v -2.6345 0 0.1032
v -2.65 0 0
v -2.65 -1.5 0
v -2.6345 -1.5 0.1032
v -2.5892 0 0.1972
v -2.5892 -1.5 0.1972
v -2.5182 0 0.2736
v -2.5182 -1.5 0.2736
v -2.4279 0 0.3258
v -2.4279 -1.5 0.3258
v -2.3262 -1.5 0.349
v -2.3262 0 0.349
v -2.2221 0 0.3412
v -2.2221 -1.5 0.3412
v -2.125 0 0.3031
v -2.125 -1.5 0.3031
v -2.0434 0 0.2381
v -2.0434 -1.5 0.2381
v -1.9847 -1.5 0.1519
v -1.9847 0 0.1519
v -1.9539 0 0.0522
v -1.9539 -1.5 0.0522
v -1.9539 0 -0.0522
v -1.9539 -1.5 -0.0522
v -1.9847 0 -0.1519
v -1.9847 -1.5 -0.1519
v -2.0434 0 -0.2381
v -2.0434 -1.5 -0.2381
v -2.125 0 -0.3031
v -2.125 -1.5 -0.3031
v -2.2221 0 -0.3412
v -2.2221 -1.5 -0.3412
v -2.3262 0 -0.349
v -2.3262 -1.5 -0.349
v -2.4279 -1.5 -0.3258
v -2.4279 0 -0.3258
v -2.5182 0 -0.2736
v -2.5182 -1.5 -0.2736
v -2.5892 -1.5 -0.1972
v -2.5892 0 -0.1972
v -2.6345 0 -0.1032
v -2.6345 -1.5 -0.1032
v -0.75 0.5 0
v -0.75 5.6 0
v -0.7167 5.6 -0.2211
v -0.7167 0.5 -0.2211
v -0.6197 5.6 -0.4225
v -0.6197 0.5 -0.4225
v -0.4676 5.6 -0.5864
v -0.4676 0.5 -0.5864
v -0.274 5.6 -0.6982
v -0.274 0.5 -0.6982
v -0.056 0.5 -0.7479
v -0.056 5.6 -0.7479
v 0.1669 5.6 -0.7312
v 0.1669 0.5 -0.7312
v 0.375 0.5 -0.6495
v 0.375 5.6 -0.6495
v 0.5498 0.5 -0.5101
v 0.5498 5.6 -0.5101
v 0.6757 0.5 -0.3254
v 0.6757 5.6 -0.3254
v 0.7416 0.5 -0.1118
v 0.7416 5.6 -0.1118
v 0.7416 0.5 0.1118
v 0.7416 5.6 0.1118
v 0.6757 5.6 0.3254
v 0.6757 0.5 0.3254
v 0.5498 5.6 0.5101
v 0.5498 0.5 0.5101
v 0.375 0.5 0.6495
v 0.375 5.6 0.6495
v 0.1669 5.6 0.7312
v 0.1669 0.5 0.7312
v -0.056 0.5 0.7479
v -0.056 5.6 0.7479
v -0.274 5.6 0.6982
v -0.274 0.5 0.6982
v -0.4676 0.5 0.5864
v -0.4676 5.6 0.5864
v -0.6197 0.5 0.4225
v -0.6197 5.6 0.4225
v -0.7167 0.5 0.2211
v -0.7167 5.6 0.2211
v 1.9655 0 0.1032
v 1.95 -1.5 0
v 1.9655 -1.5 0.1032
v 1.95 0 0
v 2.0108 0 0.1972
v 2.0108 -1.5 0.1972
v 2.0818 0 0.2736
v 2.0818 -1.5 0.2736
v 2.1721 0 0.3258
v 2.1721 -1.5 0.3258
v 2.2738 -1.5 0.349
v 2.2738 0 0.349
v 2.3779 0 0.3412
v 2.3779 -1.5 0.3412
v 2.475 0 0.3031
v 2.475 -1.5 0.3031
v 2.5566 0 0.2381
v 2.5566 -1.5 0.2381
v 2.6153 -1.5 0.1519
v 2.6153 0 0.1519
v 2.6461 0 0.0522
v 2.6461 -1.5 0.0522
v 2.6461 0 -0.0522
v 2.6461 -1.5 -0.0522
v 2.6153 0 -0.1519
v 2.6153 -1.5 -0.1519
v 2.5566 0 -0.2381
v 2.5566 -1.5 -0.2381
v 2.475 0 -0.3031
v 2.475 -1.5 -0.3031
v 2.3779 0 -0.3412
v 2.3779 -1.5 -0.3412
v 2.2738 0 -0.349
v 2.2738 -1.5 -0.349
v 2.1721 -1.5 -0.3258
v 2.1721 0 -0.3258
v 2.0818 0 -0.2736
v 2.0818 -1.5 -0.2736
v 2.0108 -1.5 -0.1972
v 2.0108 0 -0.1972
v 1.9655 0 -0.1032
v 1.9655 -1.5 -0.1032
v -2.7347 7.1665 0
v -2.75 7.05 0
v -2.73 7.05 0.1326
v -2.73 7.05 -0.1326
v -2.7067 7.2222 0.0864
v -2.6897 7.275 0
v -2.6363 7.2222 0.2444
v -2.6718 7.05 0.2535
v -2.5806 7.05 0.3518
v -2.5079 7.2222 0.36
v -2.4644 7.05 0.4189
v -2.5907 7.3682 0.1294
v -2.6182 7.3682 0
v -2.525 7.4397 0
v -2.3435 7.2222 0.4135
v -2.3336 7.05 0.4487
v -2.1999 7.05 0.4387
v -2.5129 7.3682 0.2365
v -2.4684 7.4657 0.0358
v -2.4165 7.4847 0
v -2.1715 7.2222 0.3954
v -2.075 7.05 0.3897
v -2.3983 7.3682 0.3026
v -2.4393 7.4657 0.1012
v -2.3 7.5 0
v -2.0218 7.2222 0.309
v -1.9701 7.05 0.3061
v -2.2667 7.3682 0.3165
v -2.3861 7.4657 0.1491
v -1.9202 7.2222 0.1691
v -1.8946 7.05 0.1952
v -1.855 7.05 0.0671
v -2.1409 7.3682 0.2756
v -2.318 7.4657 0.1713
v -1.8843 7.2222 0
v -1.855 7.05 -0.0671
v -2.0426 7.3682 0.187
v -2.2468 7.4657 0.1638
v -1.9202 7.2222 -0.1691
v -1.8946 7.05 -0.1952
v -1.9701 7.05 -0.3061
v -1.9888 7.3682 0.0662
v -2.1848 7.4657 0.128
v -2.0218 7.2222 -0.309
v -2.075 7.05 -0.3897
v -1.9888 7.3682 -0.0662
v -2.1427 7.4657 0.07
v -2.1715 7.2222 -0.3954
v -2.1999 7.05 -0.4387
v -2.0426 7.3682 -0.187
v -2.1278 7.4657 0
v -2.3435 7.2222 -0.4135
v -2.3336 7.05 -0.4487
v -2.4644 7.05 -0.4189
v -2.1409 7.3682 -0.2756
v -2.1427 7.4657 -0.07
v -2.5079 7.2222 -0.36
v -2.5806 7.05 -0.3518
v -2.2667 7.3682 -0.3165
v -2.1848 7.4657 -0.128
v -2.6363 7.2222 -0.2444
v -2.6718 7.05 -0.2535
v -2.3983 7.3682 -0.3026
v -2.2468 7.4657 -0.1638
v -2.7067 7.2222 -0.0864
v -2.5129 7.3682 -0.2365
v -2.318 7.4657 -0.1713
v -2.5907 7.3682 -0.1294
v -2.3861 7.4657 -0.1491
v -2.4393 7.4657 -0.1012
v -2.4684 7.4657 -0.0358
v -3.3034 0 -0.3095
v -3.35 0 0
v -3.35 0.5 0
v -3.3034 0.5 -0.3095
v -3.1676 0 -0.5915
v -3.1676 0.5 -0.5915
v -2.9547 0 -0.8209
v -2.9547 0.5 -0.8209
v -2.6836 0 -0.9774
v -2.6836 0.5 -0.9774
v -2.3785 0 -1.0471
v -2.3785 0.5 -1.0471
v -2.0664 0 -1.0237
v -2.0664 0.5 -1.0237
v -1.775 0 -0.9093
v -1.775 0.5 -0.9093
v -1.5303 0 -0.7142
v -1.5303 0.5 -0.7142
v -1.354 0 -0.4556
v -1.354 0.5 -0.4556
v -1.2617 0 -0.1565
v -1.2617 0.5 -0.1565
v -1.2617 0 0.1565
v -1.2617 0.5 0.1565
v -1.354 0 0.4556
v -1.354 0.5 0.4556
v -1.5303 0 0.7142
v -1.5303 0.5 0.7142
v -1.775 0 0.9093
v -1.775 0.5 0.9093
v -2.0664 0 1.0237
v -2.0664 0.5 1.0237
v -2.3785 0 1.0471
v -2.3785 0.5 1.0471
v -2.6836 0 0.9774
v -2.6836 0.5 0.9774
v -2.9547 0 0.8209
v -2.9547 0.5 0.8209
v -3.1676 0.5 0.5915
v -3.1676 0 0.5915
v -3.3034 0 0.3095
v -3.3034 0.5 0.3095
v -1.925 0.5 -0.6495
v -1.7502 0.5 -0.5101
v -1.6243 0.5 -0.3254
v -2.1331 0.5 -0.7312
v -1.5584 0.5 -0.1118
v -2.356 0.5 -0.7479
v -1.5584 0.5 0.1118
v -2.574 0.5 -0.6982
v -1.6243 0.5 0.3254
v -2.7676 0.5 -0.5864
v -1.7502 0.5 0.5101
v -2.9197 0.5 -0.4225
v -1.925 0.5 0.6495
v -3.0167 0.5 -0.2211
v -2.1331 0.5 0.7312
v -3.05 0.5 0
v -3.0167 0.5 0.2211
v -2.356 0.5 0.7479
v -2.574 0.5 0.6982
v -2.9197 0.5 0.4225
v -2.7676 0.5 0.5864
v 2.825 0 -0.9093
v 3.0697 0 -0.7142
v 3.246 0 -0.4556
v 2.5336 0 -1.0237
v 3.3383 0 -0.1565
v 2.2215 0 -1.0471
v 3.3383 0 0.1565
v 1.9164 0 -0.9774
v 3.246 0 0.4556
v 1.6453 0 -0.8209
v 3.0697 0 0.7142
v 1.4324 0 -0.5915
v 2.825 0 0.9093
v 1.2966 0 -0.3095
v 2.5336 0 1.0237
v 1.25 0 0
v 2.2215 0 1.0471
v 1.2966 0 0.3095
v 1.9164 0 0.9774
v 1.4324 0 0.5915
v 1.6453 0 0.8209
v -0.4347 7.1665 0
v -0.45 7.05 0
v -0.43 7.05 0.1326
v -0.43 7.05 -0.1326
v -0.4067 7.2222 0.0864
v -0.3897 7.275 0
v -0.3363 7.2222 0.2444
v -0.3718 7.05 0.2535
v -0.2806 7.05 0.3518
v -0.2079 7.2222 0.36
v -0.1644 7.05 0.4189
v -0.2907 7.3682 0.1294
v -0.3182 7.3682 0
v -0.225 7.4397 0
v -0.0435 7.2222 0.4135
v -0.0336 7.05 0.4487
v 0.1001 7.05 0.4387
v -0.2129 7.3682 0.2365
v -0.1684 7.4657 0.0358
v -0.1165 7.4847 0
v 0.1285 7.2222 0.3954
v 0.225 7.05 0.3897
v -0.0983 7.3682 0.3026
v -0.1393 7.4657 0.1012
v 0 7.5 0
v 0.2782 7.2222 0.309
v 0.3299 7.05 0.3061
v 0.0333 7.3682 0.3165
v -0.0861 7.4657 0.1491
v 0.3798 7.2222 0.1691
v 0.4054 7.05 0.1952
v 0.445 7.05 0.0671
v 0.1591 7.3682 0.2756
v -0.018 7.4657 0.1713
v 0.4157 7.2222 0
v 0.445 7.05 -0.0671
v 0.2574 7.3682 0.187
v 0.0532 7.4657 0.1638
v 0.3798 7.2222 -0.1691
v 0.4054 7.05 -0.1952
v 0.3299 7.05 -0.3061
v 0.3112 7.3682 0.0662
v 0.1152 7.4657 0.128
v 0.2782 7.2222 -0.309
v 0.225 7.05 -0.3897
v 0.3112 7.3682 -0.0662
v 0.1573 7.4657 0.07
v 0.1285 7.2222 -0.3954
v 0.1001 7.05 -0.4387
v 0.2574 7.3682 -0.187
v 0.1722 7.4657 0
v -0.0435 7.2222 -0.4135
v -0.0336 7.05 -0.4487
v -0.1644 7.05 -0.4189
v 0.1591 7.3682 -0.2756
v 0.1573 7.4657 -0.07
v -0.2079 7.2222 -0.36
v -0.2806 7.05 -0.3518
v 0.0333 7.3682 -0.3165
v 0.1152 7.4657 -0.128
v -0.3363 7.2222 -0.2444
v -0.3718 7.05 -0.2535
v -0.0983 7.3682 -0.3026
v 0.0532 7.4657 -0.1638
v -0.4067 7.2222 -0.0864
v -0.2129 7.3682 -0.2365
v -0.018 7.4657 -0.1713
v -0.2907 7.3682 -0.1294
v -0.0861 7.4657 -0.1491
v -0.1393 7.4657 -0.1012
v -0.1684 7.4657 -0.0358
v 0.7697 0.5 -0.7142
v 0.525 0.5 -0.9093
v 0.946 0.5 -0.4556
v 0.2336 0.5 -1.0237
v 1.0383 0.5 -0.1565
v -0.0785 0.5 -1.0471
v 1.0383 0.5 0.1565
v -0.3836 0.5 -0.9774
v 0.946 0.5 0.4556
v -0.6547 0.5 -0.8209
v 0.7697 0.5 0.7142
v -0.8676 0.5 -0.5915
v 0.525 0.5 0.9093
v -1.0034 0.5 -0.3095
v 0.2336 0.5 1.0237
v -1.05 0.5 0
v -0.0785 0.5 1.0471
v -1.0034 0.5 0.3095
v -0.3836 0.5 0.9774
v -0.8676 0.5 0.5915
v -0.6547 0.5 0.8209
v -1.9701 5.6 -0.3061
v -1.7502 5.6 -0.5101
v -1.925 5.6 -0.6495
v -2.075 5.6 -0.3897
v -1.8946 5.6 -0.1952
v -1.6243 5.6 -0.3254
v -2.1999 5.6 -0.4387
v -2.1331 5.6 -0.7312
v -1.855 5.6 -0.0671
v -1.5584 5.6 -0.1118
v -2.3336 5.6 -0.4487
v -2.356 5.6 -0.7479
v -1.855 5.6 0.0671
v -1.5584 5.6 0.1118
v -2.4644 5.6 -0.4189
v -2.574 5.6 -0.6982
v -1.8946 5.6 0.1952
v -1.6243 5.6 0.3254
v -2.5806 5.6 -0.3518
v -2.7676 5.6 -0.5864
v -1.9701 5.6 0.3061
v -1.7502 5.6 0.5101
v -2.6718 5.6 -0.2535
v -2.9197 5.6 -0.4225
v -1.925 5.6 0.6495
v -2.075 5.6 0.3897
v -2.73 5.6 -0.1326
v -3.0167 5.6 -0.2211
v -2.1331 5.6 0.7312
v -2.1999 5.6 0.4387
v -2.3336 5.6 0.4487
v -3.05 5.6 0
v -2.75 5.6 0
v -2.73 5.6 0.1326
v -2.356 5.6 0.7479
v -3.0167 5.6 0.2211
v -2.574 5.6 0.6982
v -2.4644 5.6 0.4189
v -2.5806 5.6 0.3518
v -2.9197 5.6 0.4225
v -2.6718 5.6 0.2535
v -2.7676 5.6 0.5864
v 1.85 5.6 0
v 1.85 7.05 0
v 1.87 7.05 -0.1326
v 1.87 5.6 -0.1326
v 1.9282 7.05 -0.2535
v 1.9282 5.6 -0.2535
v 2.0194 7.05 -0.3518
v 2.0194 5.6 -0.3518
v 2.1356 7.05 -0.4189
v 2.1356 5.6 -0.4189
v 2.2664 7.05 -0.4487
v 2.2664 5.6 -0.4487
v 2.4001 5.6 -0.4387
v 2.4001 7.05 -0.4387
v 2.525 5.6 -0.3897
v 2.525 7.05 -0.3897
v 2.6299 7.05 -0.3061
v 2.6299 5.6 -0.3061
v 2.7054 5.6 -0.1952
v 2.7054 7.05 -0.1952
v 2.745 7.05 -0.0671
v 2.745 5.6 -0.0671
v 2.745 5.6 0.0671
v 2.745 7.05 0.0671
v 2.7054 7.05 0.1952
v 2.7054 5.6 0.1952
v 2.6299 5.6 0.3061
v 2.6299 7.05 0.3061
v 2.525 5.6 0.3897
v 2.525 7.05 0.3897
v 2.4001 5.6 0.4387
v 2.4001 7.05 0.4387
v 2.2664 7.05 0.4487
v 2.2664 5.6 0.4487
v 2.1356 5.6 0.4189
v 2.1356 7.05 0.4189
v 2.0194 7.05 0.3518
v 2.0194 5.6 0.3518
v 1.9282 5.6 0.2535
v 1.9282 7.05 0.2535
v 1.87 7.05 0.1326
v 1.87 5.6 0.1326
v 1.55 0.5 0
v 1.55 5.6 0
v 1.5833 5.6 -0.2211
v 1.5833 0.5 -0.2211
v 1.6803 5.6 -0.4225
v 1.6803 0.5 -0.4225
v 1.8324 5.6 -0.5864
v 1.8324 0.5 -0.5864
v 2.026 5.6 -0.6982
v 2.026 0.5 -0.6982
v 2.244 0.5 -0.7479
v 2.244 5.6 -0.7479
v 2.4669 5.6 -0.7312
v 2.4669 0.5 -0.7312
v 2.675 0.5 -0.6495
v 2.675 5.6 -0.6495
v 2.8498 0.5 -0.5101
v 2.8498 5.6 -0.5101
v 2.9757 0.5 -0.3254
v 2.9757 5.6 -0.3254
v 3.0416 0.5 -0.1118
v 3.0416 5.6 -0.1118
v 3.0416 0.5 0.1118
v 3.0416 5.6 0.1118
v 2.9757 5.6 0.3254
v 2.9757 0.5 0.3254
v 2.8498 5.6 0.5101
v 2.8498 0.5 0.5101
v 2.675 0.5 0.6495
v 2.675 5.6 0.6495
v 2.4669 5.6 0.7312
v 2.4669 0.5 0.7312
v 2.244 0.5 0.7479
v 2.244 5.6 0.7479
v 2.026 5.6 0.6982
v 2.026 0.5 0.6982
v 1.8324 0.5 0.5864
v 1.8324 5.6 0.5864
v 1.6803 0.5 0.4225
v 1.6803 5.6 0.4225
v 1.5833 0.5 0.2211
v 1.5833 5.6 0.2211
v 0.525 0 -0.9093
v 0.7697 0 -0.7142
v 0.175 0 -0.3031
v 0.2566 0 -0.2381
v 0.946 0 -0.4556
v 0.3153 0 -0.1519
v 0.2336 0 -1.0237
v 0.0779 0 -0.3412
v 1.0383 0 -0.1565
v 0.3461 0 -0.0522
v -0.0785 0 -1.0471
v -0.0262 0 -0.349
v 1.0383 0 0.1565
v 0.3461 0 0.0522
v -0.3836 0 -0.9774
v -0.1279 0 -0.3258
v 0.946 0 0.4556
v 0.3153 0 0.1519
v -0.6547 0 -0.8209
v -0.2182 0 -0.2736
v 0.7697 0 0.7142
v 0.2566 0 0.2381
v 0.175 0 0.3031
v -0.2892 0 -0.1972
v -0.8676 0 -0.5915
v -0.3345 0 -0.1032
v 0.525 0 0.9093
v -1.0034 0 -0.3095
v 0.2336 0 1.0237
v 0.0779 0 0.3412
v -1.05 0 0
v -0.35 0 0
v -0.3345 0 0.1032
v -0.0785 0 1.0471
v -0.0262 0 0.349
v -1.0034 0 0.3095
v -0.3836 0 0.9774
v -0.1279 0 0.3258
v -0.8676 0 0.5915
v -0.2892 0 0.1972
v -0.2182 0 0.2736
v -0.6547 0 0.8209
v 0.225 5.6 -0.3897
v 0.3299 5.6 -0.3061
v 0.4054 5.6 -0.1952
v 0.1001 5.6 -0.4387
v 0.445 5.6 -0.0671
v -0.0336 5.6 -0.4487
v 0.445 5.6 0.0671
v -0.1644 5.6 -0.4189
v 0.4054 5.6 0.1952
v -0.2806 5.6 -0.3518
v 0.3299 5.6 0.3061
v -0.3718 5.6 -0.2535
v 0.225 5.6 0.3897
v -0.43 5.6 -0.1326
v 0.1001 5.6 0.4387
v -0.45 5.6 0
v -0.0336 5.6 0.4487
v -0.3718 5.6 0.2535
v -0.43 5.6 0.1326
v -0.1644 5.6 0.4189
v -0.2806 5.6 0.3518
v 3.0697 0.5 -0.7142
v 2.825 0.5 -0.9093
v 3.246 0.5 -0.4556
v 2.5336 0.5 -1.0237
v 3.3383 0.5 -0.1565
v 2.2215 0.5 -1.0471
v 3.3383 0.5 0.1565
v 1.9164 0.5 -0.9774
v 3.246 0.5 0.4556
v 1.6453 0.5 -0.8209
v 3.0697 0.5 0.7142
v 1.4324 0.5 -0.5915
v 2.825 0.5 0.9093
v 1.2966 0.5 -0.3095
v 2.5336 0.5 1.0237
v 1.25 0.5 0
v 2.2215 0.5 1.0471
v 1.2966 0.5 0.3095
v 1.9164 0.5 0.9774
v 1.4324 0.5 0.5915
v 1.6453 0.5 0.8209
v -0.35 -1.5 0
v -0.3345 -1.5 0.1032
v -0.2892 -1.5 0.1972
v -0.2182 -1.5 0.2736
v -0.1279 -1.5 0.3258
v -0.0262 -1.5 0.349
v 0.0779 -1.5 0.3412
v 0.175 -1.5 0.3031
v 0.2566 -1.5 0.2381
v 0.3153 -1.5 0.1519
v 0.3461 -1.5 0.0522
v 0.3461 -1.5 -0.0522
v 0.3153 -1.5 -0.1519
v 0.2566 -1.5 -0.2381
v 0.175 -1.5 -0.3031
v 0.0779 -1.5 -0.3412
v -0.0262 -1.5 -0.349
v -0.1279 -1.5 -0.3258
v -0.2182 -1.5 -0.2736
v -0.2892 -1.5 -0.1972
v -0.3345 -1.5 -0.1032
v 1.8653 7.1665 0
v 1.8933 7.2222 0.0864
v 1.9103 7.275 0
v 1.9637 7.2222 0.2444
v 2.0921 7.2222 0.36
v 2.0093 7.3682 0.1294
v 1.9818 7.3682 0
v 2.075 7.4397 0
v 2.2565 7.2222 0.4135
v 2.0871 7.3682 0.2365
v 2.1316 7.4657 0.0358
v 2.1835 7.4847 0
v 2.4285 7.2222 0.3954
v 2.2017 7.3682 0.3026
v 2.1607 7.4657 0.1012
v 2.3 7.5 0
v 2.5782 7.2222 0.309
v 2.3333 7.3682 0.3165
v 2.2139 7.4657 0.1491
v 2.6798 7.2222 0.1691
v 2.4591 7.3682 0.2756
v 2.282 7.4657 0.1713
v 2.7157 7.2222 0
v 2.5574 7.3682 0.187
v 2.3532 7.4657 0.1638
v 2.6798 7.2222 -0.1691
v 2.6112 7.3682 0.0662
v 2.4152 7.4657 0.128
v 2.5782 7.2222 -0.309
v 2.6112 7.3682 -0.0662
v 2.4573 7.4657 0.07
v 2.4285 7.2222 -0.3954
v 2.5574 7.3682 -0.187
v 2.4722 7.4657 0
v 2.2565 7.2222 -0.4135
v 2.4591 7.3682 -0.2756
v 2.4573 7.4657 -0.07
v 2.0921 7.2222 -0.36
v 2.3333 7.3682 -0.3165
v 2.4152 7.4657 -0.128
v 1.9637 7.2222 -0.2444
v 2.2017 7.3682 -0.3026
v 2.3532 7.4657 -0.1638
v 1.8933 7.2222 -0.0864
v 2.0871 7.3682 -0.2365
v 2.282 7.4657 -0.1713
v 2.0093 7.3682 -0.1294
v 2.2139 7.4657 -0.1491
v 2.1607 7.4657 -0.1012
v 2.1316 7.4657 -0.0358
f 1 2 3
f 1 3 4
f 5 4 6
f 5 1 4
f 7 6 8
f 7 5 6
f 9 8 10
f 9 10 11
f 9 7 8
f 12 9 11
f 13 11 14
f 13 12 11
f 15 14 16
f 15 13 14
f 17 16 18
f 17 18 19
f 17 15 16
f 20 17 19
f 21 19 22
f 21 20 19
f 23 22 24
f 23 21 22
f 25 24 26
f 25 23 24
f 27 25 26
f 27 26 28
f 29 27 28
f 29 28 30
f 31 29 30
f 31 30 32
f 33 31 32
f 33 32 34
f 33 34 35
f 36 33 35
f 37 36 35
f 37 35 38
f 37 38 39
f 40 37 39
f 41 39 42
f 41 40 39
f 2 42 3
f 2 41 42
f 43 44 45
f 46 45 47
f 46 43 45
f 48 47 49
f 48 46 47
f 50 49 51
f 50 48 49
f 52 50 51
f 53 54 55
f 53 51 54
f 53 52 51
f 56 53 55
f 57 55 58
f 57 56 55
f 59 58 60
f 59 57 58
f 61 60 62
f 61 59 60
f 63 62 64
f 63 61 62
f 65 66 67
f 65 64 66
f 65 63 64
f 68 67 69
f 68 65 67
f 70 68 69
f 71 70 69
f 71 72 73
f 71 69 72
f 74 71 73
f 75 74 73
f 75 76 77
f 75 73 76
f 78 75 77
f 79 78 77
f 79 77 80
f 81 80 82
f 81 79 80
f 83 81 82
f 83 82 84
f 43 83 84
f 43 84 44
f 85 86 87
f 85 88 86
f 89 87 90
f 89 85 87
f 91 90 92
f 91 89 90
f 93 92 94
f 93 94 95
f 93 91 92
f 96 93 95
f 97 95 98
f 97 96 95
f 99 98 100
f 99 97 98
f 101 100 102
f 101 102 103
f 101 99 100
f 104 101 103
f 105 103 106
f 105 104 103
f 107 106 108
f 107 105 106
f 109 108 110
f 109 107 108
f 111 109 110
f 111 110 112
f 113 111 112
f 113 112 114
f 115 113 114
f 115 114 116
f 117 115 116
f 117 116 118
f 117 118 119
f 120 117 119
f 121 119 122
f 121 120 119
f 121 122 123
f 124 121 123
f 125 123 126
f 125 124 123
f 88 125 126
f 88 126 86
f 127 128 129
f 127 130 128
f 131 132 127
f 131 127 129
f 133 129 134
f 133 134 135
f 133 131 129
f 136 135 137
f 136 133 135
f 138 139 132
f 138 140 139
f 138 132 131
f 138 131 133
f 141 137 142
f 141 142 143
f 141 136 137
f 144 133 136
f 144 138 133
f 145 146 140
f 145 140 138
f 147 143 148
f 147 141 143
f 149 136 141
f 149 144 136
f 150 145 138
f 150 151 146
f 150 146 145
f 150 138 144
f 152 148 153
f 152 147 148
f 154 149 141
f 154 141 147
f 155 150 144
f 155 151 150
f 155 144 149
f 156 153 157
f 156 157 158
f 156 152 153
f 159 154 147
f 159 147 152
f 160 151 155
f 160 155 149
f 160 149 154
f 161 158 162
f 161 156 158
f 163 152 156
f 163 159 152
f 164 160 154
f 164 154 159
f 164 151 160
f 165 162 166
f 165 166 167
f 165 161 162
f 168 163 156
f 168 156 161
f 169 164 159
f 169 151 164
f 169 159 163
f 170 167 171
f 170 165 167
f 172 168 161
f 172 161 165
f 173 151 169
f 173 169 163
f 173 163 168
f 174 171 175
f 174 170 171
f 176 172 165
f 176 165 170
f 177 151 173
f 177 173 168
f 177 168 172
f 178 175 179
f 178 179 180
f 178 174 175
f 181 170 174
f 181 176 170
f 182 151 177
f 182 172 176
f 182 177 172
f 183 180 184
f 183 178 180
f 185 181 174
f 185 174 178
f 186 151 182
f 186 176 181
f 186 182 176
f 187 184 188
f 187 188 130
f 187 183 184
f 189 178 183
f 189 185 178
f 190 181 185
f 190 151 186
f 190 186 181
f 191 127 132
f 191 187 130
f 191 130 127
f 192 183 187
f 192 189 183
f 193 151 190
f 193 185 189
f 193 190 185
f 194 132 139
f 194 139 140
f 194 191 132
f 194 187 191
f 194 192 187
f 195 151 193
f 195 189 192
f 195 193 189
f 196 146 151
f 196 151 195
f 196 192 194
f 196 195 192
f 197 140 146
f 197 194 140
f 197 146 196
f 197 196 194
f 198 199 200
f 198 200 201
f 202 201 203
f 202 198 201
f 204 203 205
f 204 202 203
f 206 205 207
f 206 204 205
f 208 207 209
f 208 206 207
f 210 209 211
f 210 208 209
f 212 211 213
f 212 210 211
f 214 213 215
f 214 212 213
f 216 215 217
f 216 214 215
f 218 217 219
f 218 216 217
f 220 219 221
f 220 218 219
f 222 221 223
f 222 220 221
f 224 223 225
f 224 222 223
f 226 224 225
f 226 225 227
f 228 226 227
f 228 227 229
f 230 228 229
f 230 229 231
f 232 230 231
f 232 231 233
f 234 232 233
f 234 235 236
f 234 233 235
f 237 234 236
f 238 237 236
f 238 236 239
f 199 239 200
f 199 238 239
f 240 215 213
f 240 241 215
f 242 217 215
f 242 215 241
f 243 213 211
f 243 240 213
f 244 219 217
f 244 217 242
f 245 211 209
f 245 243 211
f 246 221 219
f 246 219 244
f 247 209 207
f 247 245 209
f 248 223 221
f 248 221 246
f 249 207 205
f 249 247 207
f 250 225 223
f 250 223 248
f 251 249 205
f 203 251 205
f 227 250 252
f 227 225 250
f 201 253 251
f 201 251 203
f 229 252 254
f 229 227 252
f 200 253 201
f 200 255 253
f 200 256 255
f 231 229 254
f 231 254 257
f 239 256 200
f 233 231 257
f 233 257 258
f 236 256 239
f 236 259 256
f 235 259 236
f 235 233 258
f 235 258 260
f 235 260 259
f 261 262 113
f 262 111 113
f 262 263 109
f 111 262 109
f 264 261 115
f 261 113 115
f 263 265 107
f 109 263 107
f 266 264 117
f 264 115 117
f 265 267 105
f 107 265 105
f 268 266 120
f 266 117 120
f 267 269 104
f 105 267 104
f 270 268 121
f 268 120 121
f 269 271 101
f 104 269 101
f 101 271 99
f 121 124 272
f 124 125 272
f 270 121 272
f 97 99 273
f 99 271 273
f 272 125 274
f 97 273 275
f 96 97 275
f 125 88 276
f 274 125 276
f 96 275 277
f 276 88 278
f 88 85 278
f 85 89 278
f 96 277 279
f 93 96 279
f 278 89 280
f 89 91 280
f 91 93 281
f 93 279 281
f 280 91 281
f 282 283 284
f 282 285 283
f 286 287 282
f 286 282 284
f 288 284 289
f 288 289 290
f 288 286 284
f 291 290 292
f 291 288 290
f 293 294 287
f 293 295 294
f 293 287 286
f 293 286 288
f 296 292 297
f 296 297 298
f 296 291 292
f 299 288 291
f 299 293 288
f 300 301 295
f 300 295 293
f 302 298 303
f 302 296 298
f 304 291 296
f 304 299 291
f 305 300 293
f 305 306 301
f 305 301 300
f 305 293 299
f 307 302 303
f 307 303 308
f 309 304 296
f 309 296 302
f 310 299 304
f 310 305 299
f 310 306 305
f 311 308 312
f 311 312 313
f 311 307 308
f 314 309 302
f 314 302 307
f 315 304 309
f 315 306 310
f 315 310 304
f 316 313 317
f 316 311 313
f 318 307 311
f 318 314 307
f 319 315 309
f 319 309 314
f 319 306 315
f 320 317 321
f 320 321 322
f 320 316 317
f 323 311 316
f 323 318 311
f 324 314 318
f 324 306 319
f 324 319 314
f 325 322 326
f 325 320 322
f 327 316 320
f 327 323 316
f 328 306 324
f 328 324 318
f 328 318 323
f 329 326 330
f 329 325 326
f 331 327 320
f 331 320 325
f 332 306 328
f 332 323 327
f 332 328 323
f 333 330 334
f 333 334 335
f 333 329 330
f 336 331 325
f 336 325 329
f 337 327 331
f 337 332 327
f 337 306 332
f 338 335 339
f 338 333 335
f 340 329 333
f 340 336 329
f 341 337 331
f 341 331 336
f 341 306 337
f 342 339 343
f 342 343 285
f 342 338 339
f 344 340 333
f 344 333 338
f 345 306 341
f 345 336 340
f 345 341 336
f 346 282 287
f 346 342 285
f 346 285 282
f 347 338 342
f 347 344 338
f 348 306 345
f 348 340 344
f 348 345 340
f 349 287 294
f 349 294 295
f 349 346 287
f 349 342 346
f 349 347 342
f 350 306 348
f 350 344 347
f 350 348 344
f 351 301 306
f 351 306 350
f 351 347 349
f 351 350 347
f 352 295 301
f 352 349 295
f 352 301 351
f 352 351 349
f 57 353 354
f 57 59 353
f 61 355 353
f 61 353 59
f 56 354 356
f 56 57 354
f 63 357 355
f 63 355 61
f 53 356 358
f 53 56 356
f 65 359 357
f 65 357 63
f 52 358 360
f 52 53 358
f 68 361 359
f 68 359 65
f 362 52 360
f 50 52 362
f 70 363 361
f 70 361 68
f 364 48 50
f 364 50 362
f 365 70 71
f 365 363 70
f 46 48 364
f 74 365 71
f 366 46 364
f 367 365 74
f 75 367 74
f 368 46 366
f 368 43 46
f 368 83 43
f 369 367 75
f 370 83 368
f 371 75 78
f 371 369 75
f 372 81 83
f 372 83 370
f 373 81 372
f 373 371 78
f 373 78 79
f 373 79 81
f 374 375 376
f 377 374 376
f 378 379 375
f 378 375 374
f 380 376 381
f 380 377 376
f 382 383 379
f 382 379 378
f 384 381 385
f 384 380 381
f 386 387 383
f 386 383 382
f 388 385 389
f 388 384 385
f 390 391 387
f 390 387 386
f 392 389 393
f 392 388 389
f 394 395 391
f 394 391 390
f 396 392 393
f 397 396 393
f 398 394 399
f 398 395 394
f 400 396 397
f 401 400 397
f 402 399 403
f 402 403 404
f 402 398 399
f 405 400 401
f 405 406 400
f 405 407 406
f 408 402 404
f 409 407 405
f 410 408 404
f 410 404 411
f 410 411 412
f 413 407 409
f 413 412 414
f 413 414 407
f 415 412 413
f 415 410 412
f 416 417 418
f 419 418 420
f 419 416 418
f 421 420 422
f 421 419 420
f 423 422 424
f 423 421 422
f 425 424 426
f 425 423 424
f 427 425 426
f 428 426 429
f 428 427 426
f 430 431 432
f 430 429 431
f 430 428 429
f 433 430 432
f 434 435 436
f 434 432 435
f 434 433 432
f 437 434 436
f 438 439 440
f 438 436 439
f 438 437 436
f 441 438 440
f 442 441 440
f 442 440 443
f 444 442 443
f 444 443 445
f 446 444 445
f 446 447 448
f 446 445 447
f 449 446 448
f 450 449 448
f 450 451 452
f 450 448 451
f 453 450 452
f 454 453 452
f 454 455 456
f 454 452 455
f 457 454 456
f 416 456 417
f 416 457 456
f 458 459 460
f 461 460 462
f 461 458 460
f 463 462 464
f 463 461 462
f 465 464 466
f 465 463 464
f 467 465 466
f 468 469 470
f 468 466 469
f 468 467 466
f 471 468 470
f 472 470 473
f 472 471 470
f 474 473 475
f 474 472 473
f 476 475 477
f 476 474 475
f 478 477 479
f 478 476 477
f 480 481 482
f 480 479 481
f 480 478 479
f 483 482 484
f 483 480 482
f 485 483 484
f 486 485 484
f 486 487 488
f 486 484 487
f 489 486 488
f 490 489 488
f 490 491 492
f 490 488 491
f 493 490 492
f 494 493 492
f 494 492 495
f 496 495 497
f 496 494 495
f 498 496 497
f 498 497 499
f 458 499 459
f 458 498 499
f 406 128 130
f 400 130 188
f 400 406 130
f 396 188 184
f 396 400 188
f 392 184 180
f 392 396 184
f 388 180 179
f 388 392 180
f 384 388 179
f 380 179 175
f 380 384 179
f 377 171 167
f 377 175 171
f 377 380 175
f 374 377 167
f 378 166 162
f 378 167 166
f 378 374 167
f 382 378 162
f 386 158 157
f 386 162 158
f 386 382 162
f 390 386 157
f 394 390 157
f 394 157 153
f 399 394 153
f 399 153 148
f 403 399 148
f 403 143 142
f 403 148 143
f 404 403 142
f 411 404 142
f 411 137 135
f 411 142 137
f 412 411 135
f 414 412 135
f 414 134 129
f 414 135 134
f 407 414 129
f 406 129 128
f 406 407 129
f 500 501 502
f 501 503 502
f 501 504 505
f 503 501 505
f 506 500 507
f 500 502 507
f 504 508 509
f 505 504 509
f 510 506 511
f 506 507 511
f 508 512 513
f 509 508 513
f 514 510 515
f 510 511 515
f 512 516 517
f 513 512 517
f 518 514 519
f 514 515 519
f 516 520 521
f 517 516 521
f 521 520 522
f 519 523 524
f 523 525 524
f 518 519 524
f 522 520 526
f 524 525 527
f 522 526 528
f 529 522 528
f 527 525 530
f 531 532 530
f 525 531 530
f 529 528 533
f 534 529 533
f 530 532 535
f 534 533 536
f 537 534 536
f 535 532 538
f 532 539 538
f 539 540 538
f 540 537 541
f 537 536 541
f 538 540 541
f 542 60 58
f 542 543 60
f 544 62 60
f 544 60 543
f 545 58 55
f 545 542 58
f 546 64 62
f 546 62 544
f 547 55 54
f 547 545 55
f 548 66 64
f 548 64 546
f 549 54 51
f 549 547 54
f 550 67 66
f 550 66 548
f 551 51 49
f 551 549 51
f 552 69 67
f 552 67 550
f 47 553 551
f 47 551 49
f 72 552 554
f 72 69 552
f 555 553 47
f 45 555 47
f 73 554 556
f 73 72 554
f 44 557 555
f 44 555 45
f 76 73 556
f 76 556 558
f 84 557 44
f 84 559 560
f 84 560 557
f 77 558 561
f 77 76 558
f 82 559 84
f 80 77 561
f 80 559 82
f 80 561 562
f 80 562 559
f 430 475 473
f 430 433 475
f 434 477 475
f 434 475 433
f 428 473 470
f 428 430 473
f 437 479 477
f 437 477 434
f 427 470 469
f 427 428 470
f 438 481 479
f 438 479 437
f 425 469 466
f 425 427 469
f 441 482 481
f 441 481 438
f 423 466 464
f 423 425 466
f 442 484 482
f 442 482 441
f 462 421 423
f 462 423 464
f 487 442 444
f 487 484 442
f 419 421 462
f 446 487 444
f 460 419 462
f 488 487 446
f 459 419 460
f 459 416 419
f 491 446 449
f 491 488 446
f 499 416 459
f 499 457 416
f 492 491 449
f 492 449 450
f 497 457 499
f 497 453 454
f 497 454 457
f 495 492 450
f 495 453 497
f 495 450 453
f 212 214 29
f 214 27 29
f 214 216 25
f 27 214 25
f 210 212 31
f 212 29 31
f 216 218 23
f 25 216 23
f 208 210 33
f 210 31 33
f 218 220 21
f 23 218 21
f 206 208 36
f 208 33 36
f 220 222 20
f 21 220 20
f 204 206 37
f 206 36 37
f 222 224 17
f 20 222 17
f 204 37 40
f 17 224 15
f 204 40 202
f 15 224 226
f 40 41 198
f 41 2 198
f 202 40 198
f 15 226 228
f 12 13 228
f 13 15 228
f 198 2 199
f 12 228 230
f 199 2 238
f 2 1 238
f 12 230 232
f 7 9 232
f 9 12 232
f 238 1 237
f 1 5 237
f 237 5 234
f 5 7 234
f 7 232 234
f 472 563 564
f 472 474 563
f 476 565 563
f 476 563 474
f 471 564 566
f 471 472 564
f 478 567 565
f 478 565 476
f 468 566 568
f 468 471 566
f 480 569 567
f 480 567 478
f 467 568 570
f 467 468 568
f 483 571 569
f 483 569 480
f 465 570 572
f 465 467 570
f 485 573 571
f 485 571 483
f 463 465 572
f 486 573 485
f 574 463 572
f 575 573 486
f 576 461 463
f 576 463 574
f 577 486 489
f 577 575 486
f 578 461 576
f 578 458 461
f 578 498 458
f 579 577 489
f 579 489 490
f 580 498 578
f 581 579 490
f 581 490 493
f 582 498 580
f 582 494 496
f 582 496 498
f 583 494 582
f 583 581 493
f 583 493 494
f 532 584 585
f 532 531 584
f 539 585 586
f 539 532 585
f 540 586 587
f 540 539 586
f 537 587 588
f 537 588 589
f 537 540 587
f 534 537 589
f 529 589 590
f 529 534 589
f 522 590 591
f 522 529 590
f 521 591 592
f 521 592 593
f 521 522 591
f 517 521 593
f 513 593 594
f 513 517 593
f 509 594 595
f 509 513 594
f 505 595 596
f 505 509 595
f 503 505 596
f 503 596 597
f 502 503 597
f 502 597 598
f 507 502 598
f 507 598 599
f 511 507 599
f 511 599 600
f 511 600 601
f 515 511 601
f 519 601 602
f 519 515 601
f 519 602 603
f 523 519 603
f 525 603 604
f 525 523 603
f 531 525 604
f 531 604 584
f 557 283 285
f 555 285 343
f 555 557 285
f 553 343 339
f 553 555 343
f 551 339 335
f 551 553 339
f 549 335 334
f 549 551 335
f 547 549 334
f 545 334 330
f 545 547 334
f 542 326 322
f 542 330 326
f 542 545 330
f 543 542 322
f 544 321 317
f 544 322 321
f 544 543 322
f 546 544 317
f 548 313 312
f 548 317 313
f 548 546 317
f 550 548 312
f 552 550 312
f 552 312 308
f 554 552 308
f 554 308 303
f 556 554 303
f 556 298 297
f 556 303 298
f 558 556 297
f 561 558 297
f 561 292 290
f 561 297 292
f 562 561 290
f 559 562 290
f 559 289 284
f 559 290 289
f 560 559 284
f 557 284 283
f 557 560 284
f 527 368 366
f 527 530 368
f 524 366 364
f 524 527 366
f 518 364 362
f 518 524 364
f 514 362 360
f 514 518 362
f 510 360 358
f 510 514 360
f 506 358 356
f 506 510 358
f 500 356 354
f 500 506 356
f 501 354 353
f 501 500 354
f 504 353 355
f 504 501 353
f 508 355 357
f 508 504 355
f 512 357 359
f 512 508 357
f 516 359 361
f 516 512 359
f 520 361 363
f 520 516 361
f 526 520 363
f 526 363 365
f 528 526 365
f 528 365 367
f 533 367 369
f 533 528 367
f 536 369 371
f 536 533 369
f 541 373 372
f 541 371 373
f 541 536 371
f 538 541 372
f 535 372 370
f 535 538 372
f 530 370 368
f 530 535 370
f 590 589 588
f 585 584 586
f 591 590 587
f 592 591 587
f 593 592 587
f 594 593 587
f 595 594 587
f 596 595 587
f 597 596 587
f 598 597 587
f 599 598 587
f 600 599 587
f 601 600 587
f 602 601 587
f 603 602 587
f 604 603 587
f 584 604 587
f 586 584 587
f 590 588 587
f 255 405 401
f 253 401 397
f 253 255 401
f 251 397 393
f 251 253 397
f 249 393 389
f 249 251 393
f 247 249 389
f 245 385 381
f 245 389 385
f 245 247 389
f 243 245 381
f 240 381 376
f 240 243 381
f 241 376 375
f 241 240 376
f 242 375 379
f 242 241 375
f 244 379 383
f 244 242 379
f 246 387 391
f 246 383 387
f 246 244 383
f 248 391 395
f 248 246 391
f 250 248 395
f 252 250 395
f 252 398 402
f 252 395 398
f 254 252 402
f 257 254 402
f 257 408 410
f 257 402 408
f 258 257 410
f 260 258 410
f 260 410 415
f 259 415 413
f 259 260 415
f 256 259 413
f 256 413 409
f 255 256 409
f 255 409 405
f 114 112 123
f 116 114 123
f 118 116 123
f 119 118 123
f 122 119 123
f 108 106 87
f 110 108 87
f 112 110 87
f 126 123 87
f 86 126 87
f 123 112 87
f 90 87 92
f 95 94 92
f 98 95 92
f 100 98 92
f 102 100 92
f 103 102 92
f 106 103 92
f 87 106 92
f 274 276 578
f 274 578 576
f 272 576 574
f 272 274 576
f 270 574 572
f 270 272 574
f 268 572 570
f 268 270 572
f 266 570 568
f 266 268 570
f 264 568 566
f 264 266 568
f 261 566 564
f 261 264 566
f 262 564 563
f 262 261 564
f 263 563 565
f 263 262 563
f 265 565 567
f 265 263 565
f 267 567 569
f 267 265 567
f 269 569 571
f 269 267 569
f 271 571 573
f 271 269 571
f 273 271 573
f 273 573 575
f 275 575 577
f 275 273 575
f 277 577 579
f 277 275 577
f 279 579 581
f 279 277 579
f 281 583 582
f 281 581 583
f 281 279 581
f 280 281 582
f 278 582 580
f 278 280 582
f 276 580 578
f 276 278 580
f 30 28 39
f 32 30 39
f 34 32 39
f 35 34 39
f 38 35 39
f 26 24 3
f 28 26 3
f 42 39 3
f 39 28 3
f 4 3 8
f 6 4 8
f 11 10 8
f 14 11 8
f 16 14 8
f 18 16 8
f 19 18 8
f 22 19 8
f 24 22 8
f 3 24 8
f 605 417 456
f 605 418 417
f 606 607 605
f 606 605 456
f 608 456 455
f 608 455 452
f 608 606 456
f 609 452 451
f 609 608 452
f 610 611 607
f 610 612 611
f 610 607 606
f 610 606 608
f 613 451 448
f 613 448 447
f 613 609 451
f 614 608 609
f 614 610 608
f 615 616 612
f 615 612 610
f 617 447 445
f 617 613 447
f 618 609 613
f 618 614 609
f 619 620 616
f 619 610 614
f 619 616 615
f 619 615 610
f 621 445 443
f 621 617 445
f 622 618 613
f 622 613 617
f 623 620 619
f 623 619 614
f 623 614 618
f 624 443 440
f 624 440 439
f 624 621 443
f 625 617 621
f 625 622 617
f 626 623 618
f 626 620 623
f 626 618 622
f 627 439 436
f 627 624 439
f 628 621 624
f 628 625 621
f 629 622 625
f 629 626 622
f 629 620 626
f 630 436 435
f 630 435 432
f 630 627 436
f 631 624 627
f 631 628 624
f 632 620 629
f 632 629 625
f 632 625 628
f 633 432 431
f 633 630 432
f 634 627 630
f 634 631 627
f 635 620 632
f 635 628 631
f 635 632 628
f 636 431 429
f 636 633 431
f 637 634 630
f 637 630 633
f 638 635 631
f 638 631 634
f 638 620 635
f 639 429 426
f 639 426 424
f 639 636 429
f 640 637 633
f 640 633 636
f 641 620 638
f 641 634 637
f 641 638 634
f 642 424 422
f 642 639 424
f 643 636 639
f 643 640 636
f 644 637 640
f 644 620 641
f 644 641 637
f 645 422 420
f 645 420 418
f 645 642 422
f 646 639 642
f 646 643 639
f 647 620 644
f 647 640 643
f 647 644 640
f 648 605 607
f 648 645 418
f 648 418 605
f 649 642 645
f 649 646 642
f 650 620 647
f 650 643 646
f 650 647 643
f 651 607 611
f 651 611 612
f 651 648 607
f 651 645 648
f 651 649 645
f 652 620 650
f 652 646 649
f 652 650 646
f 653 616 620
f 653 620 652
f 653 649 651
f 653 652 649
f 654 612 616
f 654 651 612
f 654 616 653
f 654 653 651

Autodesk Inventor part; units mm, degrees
ref_plane "YZ Plane" through (0, 0, 0) normal (1, 0, 0) x (0, 1, 0)
ref_plane "XZ Plane" through (0, 0, 0) normal (0, 1, 0) x (-1, 0, 0)
sketch "Sketch1" plane through (0, 0, 0) normal (0, 1, 0) x (-1, 0, 0)
  line L0 (-8.55, 0) -> (-8.55, 0)
  line L1 (5.4, 2.35) -> (-5.4, 2.35)
  line L2 (-7.75, 0) -> (-7.75, 0)
  line L3 (7.75, 0) -> (7.75, 0)
  arc A0 (-5.4, 2.35) -> (-7.75, 0) centre (-5.4, 0) ccw
  arc A1 (-7.75, 0) -> (-5.4, -2.35) centre (-5.4, 0) ccw
  arc A2 (7.75, 0) -> (5.4, 2.35) centre (5.4, 0) ccw
  arc A3 (5.4, -2.35) -> (7.75, 0) centre (5.4, 0) ccw
  circle A4 centre (5.4, 0) radius 1.5
  circle A5 centre (-5.4, 0) radius 1.5
  circle A6 centre (2.3, 0) radius 0.75
  circle A7 centre (0, 0) radius 0.75
  circle A8 centre (-2.3, 0) radius 0.75
  circle A9 centre (2.3, 0) radius 0.35
  circle A10 centre (0, 0) radius 0.35
  circle A11 centre (-2.3, 0) radius 0.45
  line L4 (-15.2366, 19.4813) -> (26.8433, 19.4813) construction
  line L5 (26.8433, 19.4813) -> (26.8433, -5.0467) construction
  line L6 (26.8433, -5.0467) -> (-15.2366, -5.0467) construction
  line L7 (-15.2366, -5.0467) -> (-15.2366, 19.4813) construction
  line L8 (-8.3717, -2.35) -> (8.3717, -2.35)
  line L9 (8.3717, 2.35) -> (-8.3717, 2.35)
  circle A12 centre (2.3, 0) radius 1.05
  circle A13 centre (0, 0) radius 1.05
  circle A14 centre (-2.3, 0) radius 1.05
  circle A15 centre (-2.3, 0) radius 0.35
  circle A16 centre (0, 0) radius 0.45
  circle A17 centre (2.3, 0) radius 0.45
  point P0 (7.75, 0)
  point P1 (-5.4, -2.35)
  point P2 (5.4, -2.35)
  dimension "d5" = 2.35
  dimension "d6" = 3
  dimension "d7" = 3
  dimension "d10" = 1.5
  dimension "d11" = 4.6
  dimension "d14" = 0.9
  dimension "d201" = 2.1
  dimension "d202" = 2.1
  dimension "d203" = 2.1
  dimension "d204" = 1.5
  dimension "d205" = 1.5
  dimension "d213" = 0.7
  dimension "d214" = 0.9
  dimension "d215" = 0.9
ref_plane "Work Plane2" through (-5.4, 0, 2.35) normal (0, 0, 1) x (1, 0, 0)
sketch "Sketch3" plane through (-5.4, 0, 2.35) normal (0, 0, 1) x (1, 0, 0)
  line L0 (-9.7661, 9.6728) -> (32.2033, 9.6728) construction
  line L1 (32.2033, 9.6728) -> (32.2033, -14.7908) construction
  line L2 (32.2033, -14.7908) -> (-9.7661, -14.7908) construction
  line L3 (-9.7661, -14.7908) -> (-9.7661, 9.6728) construction
  point P0 (5.4, 0)
extrude "Extrusion9" add sketch "Sketch1" along normal blind 0.5 contours A6 | A7 | A8 | A9 | A10 | A11 | A12 | A13 | A14 | A15 | A16 | A17
extrude "Extrusion10" add sketch "Sketch1" against normal blind 1.5 contours A9 | A10 | A15
extrude "Extrusion11" add sketch "Sketch1" along normal blind 5.6 contours A6 | A7 | A8 | A9 | A10 | A11 | A15 | A16 | A17
extrude "Extrusion12" add sketch "Sketch1" along normal blind 7.5 contours A9 | A10 | A11 | A15 | A16 | A17
fillet "Fillet1" radius 0.45 3 edges at (2.75, 7.5, 0) (0.45, 7.5, 0) (-1.85, 7.5, 0)
properties part number "Pogo2" material "Copper"
